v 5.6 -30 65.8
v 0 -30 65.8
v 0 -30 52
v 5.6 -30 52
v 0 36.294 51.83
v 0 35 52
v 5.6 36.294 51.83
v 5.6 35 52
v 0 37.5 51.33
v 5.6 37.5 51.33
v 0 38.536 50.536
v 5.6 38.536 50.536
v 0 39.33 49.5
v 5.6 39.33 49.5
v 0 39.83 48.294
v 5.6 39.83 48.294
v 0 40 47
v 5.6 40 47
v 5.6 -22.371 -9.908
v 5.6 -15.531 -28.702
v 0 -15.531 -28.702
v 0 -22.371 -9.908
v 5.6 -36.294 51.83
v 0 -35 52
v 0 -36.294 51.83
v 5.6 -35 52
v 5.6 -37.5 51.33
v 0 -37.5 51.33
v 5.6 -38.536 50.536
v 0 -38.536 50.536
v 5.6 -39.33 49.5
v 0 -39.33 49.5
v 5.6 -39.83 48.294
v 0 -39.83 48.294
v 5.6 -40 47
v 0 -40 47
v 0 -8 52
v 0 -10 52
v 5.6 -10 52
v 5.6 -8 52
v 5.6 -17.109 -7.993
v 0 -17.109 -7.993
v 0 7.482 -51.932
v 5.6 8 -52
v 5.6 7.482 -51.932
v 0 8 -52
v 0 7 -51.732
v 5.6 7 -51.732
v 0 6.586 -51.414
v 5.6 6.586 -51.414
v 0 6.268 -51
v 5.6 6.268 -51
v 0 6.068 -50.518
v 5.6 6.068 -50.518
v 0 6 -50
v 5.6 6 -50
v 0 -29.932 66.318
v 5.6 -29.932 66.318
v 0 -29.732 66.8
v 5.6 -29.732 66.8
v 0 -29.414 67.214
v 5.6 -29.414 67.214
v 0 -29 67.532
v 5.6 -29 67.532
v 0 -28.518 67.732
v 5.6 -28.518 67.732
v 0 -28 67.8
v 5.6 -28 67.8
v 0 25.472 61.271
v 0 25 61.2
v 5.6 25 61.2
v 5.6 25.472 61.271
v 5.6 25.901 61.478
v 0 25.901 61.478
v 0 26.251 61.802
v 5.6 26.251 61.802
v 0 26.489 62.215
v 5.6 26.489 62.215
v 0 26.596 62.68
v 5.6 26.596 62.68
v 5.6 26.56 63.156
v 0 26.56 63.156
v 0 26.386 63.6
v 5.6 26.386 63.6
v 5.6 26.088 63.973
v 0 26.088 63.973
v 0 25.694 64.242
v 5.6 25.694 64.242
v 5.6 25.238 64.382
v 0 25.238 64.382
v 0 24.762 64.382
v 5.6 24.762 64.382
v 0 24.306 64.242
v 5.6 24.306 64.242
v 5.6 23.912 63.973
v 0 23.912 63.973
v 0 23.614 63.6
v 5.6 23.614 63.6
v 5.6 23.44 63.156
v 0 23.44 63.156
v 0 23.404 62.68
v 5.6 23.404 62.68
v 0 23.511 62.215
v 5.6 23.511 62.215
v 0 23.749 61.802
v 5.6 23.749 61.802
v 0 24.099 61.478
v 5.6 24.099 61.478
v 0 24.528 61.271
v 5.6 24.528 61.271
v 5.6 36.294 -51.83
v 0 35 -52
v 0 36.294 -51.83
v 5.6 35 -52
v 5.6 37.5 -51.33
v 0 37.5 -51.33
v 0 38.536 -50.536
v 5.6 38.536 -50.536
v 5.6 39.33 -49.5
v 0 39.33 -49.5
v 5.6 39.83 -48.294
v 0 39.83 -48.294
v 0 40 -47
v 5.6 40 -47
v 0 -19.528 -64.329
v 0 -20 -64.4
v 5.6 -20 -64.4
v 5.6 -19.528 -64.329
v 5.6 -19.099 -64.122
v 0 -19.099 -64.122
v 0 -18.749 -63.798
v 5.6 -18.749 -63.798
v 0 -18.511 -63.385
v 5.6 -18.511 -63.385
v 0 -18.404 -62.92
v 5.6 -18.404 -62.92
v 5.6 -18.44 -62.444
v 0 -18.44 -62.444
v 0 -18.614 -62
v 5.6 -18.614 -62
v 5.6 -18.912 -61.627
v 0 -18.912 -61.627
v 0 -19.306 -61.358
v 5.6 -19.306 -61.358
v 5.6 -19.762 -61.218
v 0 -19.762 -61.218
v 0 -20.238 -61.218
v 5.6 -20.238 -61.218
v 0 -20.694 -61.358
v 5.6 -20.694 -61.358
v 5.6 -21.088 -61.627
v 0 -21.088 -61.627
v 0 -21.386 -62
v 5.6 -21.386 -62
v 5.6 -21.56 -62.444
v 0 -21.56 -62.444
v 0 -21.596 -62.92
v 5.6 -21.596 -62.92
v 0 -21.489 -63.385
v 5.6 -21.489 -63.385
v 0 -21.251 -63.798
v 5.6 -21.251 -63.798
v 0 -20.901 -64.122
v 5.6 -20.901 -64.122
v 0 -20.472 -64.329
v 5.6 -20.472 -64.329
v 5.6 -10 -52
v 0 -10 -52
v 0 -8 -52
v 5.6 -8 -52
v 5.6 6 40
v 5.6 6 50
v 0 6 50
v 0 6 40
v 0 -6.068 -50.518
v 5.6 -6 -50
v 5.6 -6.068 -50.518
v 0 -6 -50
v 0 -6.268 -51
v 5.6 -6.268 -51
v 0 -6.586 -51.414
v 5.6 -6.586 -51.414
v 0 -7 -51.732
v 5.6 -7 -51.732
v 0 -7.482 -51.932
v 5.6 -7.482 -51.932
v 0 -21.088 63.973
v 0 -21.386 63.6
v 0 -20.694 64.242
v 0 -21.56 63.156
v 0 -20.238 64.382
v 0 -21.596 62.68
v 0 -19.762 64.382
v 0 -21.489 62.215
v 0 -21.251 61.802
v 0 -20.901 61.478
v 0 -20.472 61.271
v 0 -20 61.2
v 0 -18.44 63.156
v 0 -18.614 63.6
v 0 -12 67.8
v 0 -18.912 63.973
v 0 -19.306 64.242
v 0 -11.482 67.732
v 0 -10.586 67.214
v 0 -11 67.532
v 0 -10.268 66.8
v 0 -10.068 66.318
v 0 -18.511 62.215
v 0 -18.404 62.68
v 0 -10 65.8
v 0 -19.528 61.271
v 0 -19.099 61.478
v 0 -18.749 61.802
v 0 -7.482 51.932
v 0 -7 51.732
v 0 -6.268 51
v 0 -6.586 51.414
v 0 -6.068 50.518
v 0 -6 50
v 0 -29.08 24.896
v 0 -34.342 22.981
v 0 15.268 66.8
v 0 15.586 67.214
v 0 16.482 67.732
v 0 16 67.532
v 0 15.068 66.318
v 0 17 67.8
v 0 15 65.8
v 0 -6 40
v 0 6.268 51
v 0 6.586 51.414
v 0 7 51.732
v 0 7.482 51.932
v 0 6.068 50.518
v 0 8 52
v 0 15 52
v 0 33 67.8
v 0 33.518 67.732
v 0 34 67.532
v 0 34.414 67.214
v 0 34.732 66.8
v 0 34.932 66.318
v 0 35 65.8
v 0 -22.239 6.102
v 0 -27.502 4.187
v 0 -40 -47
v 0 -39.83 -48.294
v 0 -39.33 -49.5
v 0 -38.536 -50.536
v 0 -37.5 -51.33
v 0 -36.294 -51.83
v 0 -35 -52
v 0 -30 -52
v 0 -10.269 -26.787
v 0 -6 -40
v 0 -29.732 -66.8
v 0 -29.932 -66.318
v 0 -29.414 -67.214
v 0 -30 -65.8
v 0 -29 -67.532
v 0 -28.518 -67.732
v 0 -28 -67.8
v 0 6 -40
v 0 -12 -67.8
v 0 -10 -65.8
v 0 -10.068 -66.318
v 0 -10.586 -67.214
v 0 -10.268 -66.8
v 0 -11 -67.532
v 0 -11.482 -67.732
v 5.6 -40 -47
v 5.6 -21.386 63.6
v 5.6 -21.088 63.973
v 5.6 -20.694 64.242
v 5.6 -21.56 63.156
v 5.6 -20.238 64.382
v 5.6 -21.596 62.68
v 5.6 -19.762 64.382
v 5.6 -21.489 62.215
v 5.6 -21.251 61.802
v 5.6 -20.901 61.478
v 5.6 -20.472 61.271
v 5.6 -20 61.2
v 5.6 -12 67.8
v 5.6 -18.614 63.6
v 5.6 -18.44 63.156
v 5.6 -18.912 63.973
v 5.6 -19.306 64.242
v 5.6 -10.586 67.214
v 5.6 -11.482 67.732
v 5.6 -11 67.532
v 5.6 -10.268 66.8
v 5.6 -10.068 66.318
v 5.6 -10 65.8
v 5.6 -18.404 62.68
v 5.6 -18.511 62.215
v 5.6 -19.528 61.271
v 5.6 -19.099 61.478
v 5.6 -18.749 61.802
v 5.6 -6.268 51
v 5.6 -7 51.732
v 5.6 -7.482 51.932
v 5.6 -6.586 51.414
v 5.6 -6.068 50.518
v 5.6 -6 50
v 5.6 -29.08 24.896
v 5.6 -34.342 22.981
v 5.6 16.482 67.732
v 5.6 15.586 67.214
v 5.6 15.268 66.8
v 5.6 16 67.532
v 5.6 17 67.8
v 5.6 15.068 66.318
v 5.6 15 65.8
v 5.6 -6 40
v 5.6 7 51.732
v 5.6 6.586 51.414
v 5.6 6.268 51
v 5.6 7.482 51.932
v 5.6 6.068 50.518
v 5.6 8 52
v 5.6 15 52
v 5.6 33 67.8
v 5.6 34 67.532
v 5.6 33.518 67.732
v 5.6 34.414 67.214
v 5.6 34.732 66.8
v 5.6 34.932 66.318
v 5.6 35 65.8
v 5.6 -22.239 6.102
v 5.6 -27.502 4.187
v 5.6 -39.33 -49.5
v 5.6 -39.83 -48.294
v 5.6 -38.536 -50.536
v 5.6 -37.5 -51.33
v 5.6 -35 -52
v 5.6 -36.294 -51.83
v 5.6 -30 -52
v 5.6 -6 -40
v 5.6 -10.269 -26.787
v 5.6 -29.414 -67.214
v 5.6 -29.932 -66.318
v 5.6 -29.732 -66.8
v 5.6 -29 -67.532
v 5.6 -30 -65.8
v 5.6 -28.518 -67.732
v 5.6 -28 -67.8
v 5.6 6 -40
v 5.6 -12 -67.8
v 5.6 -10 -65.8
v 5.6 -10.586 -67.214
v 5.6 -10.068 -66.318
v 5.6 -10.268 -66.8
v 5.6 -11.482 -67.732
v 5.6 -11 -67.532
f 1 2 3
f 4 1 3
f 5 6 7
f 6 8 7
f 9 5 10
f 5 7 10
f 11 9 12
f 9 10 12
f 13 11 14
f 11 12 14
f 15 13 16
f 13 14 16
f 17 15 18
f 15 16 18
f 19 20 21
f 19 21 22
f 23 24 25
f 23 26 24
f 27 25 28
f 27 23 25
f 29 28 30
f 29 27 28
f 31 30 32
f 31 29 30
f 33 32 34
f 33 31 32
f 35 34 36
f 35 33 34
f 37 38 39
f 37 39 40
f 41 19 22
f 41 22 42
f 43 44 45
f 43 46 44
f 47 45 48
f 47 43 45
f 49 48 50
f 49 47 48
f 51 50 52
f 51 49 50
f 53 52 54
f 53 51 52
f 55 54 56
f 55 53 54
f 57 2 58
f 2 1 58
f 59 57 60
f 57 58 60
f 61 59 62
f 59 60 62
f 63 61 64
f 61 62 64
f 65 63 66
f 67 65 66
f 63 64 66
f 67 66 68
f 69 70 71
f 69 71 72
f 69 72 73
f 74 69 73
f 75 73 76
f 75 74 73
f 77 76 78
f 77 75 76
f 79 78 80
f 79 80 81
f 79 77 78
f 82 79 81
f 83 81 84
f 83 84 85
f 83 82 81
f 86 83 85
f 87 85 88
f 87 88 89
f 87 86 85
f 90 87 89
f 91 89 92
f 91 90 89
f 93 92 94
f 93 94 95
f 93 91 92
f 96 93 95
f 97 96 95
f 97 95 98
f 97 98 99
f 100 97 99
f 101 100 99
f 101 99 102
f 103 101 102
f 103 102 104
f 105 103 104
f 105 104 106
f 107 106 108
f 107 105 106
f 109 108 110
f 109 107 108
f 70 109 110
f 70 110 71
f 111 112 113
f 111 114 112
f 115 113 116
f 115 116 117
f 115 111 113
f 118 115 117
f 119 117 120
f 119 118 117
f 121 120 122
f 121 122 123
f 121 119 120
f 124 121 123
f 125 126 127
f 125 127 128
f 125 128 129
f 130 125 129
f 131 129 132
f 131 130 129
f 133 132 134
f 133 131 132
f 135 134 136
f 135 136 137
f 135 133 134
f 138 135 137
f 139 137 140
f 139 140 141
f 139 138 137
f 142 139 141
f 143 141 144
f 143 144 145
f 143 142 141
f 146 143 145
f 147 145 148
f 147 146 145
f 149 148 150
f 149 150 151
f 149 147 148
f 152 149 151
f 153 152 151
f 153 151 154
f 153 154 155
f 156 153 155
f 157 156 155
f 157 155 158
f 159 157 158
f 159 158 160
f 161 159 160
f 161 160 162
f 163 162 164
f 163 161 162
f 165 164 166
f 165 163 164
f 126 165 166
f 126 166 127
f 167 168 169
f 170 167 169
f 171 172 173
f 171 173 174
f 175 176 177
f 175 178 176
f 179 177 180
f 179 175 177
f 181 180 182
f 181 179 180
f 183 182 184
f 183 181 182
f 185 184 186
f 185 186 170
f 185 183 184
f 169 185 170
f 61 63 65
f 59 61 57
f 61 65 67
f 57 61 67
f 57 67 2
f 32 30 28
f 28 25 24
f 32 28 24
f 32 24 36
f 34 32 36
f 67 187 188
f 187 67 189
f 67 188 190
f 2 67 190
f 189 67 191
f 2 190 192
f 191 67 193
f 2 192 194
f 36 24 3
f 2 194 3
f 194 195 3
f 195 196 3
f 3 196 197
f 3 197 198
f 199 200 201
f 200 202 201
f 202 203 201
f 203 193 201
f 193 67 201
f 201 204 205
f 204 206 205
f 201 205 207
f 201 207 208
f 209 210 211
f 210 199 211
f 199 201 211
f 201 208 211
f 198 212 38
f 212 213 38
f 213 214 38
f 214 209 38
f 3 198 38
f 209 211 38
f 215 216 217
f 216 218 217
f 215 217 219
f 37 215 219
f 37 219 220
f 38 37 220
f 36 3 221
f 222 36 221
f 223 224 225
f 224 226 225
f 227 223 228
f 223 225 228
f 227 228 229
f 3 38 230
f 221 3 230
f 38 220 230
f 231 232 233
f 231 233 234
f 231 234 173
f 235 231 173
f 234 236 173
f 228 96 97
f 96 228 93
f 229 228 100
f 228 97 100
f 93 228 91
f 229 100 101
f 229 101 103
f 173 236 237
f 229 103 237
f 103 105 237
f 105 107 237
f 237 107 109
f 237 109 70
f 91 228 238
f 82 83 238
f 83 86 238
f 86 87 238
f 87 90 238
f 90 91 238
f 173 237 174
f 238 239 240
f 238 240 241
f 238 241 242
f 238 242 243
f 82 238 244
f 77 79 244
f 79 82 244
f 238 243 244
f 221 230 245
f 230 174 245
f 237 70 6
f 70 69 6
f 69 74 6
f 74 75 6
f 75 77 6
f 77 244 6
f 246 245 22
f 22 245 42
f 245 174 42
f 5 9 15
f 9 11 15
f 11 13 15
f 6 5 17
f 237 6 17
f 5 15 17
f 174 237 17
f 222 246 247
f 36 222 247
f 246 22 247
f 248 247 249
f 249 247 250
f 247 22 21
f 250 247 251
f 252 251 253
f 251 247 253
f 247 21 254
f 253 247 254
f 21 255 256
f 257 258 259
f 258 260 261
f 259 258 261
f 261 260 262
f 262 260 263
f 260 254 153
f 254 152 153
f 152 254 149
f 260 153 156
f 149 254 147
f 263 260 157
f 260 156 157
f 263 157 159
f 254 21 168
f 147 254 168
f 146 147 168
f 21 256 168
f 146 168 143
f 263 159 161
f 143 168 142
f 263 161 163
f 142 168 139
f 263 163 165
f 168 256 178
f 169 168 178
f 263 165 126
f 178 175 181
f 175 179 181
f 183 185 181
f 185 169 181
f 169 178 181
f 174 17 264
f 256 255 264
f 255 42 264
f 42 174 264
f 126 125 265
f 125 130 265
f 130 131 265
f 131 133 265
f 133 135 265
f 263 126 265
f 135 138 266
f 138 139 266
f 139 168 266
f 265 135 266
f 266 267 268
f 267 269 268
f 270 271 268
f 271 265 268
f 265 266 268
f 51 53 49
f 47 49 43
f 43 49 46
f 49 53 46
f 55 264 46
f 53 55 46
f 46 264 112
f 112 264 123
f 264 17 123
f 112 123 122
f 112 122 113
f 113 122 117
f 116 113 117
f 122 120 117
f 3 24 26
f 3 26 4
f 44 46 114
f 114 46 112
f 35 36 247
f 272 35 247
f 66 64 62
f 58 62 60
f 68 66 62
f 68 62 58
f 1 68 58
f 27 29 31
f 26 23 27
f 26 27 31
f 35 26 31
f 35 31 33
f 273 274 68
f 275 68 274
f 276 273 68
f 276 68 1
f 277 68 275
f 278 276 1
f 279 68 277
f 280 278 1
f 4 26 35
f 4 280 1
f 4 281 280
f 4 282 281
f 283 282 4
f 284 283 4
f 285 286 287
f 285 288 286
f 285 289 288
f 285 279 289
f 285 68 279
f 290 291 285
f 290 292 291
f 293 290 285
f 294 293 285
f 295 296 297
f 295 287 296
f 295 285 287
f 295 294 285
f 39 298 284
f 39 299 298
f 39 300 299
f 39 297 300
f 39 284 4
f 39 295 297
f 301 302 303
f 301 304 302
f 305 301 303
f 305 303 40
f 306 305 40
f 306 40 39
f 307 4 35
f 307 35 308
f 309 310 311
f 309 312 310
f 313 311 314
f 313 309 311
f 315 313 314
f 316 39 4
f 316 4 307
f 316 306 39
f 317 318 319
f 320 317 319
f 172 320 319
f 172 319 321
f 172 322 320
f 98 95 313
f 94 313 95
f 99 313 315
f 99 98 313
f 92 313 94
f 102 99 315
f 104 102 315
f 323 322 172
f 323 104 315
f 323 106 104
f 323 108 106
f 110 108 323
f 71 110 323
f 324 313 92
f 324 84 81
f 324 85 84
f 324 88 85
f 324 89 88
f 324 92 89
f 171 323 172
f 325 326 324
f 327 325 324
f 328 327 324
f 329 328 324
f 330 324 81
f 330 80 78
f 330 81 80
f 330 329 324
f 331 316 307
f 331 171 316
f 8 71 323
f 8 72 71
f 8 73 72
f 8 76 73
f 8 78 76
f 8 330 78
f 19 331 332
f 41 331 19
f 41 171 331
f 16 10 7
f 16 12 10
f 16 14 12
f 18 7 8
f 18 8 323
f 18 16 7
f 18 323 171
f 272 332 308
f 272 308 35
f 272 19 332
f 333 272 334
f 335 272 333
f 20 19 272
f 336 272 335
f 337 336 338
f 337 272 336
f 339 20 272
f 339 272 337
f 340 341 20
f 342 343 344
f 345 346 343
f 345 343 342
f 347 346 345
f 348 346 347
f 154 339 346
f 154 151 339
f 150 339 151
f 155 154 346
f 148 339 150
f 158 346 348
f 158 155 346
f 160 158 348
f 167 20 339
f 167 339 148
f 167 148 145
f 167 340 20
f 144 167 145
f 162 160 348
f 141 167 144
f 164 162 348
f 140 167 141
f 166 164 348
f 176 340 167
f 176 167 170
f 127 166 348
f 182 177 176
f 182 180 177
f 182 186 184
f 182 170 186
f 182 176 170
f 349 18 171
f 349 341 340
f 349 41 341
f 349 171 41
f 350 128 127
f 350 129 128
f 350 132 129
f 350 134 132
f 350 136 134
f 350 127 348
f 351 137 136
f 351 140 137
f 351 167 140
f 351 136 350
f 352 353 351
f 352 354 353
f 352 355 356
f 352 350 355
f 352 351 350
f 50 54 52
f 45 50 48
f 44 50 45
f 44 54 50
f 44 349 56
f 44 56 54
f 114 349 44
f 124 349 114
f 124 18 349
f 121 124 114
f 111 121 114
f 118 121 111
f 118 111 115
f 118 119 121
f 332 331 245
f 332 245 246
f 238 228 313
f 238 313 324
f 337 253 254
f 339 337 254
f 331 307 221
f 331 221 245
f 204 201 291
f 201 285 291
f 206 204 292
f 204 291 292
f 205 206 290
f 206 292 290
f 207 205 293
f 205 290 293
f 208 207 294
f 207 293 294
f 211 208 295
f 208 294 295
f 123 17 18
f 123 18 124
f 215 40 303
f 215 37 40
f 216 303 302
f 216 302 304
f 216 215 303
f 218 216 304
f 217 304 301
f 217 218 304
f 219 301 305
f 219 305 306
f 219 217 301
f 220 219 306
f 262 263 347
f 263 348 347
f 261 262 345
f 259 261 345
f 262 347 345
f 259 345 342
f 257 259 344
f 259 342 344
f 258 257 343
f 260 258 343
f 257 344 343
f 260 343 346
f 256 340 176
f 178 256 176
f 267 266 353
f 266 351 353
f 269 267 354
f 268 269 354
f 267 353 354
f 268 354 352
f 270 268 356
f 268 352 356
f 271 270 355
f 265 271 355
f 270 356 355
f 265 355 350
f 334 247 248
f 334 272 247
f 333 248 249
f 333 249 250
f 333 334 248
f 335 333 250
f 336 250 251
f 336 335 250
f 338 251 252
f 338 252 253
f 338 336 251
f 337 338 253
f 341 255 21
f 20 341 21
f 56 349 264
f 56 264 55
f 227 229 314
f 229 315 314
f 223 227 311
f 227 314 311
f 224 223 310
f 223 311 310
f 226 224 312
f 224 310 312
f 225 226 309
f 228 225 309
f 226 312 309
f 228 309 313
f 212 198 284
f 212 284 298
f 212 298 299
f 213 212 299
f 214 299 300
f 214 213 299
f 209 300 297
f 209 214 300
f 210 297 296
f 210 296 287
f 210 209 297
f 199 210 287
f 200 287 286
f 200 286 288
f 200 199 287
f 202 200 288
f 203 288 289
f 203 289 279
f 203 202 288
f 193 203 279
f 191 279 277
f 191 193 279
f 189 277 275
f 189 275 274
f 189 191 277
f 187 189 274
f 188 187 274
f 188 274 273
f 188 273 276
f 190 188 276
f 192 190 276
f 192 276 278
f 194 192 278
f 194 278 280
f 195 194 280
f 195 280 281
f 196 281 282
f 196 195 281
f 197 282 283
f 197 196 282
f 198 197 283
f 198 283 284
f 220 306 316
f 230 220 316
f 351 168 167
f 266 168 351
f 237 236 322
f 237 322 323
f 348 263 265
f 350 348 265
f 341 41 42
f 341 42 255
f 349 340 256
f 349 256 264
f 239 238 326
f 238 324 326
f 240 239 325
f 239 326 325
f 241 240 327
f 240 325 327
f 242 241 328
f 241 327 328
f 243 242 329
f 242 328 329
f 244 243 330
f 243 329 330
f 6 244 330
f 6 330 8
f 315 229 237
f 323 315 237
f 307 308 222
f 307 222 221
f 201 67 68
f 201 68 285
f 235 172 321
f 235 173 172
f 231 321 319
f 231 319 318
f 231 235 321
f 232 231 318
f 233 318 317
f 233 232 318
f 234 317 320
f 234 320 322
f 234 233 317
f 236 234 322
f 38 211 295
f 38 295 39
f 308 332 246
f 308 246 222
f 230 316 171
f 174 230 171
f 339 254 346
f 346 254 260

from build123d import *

# Parameters (mm, degrees)
SKETCH_1_W          = 104
SKETCH_1_H          = 80
SKETCH_1_W_2        = 15.8
SKETCH_1_H_2        = 20
SKETCH_1_R          = 1.6
EXTRUDE_1_DEPTH     = 5.6
FILLET_1_R          = 5
CUT_EXTRUDE_1_DEPTH = 79.918945761
SKETCH_4_W          = 12
SKETCH_4_H          = 12
CUT_EXTRUDE_2_DEPTH = 79.918945761
FILLET_2_R          = 2


with BuildPart() as part:
    # ｽｹｯﾁ1 → ﾎﾞｽ - 押し出し1 (new body)
    # profile 1 of 4: a face of its own
    with BuildSketch(Plane(origin=(0, 0, 0), x_dir=(0, 0, -1), z_dir=(1, 0, 0))):
        Rectangle(SKETCH_1_W, SKETCH_1_H)
    # profile 2 of 4: a face of its own
    with BuildSketch(Plane(origin=(0, 0, 0), x_dir=(0, 0, -1), z_dir=(1, 0, 0))):
        with Locations((-59.9, 25)):
            Rectangle(SKETCH_1_W_2, SKETCH_1_H_2)
        with Locations((-62.8, 25)):
            Circle(SKETCH_1_R, mode=Mode.SUBTRACT)
    # profile 3 of 4: a face of its own
    with BuildSketch(Plane(origin=(0, 0, 0), x_dir=(0, 0, -1), z_dir=(1, 0, 0))):
        with Locations((59.9, -20)):
            Rectangle(SKETCH_1_W_2, SKETCH_1_H_2)
        with Locations((62.8, -20)):
            Circle(SKETCH_1_R, mode=Mode.SUBTRACT)
    # profile 4 of 4: a face of its own
    with BuildSketch(Plane(origin=(0, 0, 0), x_dir=(0, 0, -1), z_dir=(1, 0, 0))):
        with Locations((-59.9, -20)):
            Rectangle(SKETCH_1_W_2, SKETCH_1_H_2)
        with Locations((-62.8, -20)):
            Circle(SKETCH_1_R, mode=Mode.SUBTRACT)
    extrude(amount=EXTRUDE_1_DEPTH)

    # ﾌｨﾚｯﾄ1
    fillet_1_edges = [part.edges().sort_by_distance(p)[0] for p in [
        (2.8, -40, -52),
        (2.8, -40, 52),
        (2.8, 40, 52),
        (2.8, 40, -52),
    ]]
    fillet(fillet_1_edges, radius=FILLET_1_R - 0.0001)  # a hair under: the kernel refuses the full size

    # ｽｹｯﾁ3 → ｶｯﾄ - 押し出し1 (cut, through all)
    with BuildSketch(Plane(origin=(5.6, 0, 0), x_dir=(0, 0, -1), z_dir=(1, 0, 0))):
        Polygon((-24.896207629, -29.079798567), (-6.102355213, -22.2393957), (-4.187042411, -27.501674377), (-22.980894827, -34.342077243), align=None)
        Polygon((7.993034098, -17.10909355), (26.786886514, -10.268690684), (28.702199317, -15.53096936), (9.908346901, -22.371372227), align=None)
    extrude(amount=-CUT_EXTRUDE_1_DEPTH, mode=Mode.SUBTRACT)

    # ｽｹｯﾁ4 → ｶｯﾄ - 押し出し2 (cut, through all)
    with BuildSketch(Plane(origin=(5.6, 0, 0), x_dir=(0, 0, -1), z_dir=(1, 0, 0))):
        with Locations((-46, 0)):
            Rectangle(SKETCH_4_W, SKETCH_4_H)
        with Locations((46, 0)):
            Rectangle(SKETCH_4_W, SKETCH_4_H)
    extrude(amount=-CUT_EXTRUDE_2_DEPTH, mode=Mode.SUBTRACT)

    # ﾌｨﾚｯﾄ2
    fillet_2_edges = [part.edges().sort_by_distance(p)[0] for p in [
        (2.8, -6, 52),
        (2.8, 6, 52),
        (2.8, 6, -52),
        (2.8, -6, -52),
        (2.8, -10, -67.8),
        (2.8, -30, -67.8),
        (2.8, -30, 67.8),
        (2.8, -10, 67.8),
        (2.8, 15, 67.8),
        (2.8, 35, 67.8),
    ]]
    fillet(fillet_2_edges, radius=FILLET_2_R)


solid = part.part
